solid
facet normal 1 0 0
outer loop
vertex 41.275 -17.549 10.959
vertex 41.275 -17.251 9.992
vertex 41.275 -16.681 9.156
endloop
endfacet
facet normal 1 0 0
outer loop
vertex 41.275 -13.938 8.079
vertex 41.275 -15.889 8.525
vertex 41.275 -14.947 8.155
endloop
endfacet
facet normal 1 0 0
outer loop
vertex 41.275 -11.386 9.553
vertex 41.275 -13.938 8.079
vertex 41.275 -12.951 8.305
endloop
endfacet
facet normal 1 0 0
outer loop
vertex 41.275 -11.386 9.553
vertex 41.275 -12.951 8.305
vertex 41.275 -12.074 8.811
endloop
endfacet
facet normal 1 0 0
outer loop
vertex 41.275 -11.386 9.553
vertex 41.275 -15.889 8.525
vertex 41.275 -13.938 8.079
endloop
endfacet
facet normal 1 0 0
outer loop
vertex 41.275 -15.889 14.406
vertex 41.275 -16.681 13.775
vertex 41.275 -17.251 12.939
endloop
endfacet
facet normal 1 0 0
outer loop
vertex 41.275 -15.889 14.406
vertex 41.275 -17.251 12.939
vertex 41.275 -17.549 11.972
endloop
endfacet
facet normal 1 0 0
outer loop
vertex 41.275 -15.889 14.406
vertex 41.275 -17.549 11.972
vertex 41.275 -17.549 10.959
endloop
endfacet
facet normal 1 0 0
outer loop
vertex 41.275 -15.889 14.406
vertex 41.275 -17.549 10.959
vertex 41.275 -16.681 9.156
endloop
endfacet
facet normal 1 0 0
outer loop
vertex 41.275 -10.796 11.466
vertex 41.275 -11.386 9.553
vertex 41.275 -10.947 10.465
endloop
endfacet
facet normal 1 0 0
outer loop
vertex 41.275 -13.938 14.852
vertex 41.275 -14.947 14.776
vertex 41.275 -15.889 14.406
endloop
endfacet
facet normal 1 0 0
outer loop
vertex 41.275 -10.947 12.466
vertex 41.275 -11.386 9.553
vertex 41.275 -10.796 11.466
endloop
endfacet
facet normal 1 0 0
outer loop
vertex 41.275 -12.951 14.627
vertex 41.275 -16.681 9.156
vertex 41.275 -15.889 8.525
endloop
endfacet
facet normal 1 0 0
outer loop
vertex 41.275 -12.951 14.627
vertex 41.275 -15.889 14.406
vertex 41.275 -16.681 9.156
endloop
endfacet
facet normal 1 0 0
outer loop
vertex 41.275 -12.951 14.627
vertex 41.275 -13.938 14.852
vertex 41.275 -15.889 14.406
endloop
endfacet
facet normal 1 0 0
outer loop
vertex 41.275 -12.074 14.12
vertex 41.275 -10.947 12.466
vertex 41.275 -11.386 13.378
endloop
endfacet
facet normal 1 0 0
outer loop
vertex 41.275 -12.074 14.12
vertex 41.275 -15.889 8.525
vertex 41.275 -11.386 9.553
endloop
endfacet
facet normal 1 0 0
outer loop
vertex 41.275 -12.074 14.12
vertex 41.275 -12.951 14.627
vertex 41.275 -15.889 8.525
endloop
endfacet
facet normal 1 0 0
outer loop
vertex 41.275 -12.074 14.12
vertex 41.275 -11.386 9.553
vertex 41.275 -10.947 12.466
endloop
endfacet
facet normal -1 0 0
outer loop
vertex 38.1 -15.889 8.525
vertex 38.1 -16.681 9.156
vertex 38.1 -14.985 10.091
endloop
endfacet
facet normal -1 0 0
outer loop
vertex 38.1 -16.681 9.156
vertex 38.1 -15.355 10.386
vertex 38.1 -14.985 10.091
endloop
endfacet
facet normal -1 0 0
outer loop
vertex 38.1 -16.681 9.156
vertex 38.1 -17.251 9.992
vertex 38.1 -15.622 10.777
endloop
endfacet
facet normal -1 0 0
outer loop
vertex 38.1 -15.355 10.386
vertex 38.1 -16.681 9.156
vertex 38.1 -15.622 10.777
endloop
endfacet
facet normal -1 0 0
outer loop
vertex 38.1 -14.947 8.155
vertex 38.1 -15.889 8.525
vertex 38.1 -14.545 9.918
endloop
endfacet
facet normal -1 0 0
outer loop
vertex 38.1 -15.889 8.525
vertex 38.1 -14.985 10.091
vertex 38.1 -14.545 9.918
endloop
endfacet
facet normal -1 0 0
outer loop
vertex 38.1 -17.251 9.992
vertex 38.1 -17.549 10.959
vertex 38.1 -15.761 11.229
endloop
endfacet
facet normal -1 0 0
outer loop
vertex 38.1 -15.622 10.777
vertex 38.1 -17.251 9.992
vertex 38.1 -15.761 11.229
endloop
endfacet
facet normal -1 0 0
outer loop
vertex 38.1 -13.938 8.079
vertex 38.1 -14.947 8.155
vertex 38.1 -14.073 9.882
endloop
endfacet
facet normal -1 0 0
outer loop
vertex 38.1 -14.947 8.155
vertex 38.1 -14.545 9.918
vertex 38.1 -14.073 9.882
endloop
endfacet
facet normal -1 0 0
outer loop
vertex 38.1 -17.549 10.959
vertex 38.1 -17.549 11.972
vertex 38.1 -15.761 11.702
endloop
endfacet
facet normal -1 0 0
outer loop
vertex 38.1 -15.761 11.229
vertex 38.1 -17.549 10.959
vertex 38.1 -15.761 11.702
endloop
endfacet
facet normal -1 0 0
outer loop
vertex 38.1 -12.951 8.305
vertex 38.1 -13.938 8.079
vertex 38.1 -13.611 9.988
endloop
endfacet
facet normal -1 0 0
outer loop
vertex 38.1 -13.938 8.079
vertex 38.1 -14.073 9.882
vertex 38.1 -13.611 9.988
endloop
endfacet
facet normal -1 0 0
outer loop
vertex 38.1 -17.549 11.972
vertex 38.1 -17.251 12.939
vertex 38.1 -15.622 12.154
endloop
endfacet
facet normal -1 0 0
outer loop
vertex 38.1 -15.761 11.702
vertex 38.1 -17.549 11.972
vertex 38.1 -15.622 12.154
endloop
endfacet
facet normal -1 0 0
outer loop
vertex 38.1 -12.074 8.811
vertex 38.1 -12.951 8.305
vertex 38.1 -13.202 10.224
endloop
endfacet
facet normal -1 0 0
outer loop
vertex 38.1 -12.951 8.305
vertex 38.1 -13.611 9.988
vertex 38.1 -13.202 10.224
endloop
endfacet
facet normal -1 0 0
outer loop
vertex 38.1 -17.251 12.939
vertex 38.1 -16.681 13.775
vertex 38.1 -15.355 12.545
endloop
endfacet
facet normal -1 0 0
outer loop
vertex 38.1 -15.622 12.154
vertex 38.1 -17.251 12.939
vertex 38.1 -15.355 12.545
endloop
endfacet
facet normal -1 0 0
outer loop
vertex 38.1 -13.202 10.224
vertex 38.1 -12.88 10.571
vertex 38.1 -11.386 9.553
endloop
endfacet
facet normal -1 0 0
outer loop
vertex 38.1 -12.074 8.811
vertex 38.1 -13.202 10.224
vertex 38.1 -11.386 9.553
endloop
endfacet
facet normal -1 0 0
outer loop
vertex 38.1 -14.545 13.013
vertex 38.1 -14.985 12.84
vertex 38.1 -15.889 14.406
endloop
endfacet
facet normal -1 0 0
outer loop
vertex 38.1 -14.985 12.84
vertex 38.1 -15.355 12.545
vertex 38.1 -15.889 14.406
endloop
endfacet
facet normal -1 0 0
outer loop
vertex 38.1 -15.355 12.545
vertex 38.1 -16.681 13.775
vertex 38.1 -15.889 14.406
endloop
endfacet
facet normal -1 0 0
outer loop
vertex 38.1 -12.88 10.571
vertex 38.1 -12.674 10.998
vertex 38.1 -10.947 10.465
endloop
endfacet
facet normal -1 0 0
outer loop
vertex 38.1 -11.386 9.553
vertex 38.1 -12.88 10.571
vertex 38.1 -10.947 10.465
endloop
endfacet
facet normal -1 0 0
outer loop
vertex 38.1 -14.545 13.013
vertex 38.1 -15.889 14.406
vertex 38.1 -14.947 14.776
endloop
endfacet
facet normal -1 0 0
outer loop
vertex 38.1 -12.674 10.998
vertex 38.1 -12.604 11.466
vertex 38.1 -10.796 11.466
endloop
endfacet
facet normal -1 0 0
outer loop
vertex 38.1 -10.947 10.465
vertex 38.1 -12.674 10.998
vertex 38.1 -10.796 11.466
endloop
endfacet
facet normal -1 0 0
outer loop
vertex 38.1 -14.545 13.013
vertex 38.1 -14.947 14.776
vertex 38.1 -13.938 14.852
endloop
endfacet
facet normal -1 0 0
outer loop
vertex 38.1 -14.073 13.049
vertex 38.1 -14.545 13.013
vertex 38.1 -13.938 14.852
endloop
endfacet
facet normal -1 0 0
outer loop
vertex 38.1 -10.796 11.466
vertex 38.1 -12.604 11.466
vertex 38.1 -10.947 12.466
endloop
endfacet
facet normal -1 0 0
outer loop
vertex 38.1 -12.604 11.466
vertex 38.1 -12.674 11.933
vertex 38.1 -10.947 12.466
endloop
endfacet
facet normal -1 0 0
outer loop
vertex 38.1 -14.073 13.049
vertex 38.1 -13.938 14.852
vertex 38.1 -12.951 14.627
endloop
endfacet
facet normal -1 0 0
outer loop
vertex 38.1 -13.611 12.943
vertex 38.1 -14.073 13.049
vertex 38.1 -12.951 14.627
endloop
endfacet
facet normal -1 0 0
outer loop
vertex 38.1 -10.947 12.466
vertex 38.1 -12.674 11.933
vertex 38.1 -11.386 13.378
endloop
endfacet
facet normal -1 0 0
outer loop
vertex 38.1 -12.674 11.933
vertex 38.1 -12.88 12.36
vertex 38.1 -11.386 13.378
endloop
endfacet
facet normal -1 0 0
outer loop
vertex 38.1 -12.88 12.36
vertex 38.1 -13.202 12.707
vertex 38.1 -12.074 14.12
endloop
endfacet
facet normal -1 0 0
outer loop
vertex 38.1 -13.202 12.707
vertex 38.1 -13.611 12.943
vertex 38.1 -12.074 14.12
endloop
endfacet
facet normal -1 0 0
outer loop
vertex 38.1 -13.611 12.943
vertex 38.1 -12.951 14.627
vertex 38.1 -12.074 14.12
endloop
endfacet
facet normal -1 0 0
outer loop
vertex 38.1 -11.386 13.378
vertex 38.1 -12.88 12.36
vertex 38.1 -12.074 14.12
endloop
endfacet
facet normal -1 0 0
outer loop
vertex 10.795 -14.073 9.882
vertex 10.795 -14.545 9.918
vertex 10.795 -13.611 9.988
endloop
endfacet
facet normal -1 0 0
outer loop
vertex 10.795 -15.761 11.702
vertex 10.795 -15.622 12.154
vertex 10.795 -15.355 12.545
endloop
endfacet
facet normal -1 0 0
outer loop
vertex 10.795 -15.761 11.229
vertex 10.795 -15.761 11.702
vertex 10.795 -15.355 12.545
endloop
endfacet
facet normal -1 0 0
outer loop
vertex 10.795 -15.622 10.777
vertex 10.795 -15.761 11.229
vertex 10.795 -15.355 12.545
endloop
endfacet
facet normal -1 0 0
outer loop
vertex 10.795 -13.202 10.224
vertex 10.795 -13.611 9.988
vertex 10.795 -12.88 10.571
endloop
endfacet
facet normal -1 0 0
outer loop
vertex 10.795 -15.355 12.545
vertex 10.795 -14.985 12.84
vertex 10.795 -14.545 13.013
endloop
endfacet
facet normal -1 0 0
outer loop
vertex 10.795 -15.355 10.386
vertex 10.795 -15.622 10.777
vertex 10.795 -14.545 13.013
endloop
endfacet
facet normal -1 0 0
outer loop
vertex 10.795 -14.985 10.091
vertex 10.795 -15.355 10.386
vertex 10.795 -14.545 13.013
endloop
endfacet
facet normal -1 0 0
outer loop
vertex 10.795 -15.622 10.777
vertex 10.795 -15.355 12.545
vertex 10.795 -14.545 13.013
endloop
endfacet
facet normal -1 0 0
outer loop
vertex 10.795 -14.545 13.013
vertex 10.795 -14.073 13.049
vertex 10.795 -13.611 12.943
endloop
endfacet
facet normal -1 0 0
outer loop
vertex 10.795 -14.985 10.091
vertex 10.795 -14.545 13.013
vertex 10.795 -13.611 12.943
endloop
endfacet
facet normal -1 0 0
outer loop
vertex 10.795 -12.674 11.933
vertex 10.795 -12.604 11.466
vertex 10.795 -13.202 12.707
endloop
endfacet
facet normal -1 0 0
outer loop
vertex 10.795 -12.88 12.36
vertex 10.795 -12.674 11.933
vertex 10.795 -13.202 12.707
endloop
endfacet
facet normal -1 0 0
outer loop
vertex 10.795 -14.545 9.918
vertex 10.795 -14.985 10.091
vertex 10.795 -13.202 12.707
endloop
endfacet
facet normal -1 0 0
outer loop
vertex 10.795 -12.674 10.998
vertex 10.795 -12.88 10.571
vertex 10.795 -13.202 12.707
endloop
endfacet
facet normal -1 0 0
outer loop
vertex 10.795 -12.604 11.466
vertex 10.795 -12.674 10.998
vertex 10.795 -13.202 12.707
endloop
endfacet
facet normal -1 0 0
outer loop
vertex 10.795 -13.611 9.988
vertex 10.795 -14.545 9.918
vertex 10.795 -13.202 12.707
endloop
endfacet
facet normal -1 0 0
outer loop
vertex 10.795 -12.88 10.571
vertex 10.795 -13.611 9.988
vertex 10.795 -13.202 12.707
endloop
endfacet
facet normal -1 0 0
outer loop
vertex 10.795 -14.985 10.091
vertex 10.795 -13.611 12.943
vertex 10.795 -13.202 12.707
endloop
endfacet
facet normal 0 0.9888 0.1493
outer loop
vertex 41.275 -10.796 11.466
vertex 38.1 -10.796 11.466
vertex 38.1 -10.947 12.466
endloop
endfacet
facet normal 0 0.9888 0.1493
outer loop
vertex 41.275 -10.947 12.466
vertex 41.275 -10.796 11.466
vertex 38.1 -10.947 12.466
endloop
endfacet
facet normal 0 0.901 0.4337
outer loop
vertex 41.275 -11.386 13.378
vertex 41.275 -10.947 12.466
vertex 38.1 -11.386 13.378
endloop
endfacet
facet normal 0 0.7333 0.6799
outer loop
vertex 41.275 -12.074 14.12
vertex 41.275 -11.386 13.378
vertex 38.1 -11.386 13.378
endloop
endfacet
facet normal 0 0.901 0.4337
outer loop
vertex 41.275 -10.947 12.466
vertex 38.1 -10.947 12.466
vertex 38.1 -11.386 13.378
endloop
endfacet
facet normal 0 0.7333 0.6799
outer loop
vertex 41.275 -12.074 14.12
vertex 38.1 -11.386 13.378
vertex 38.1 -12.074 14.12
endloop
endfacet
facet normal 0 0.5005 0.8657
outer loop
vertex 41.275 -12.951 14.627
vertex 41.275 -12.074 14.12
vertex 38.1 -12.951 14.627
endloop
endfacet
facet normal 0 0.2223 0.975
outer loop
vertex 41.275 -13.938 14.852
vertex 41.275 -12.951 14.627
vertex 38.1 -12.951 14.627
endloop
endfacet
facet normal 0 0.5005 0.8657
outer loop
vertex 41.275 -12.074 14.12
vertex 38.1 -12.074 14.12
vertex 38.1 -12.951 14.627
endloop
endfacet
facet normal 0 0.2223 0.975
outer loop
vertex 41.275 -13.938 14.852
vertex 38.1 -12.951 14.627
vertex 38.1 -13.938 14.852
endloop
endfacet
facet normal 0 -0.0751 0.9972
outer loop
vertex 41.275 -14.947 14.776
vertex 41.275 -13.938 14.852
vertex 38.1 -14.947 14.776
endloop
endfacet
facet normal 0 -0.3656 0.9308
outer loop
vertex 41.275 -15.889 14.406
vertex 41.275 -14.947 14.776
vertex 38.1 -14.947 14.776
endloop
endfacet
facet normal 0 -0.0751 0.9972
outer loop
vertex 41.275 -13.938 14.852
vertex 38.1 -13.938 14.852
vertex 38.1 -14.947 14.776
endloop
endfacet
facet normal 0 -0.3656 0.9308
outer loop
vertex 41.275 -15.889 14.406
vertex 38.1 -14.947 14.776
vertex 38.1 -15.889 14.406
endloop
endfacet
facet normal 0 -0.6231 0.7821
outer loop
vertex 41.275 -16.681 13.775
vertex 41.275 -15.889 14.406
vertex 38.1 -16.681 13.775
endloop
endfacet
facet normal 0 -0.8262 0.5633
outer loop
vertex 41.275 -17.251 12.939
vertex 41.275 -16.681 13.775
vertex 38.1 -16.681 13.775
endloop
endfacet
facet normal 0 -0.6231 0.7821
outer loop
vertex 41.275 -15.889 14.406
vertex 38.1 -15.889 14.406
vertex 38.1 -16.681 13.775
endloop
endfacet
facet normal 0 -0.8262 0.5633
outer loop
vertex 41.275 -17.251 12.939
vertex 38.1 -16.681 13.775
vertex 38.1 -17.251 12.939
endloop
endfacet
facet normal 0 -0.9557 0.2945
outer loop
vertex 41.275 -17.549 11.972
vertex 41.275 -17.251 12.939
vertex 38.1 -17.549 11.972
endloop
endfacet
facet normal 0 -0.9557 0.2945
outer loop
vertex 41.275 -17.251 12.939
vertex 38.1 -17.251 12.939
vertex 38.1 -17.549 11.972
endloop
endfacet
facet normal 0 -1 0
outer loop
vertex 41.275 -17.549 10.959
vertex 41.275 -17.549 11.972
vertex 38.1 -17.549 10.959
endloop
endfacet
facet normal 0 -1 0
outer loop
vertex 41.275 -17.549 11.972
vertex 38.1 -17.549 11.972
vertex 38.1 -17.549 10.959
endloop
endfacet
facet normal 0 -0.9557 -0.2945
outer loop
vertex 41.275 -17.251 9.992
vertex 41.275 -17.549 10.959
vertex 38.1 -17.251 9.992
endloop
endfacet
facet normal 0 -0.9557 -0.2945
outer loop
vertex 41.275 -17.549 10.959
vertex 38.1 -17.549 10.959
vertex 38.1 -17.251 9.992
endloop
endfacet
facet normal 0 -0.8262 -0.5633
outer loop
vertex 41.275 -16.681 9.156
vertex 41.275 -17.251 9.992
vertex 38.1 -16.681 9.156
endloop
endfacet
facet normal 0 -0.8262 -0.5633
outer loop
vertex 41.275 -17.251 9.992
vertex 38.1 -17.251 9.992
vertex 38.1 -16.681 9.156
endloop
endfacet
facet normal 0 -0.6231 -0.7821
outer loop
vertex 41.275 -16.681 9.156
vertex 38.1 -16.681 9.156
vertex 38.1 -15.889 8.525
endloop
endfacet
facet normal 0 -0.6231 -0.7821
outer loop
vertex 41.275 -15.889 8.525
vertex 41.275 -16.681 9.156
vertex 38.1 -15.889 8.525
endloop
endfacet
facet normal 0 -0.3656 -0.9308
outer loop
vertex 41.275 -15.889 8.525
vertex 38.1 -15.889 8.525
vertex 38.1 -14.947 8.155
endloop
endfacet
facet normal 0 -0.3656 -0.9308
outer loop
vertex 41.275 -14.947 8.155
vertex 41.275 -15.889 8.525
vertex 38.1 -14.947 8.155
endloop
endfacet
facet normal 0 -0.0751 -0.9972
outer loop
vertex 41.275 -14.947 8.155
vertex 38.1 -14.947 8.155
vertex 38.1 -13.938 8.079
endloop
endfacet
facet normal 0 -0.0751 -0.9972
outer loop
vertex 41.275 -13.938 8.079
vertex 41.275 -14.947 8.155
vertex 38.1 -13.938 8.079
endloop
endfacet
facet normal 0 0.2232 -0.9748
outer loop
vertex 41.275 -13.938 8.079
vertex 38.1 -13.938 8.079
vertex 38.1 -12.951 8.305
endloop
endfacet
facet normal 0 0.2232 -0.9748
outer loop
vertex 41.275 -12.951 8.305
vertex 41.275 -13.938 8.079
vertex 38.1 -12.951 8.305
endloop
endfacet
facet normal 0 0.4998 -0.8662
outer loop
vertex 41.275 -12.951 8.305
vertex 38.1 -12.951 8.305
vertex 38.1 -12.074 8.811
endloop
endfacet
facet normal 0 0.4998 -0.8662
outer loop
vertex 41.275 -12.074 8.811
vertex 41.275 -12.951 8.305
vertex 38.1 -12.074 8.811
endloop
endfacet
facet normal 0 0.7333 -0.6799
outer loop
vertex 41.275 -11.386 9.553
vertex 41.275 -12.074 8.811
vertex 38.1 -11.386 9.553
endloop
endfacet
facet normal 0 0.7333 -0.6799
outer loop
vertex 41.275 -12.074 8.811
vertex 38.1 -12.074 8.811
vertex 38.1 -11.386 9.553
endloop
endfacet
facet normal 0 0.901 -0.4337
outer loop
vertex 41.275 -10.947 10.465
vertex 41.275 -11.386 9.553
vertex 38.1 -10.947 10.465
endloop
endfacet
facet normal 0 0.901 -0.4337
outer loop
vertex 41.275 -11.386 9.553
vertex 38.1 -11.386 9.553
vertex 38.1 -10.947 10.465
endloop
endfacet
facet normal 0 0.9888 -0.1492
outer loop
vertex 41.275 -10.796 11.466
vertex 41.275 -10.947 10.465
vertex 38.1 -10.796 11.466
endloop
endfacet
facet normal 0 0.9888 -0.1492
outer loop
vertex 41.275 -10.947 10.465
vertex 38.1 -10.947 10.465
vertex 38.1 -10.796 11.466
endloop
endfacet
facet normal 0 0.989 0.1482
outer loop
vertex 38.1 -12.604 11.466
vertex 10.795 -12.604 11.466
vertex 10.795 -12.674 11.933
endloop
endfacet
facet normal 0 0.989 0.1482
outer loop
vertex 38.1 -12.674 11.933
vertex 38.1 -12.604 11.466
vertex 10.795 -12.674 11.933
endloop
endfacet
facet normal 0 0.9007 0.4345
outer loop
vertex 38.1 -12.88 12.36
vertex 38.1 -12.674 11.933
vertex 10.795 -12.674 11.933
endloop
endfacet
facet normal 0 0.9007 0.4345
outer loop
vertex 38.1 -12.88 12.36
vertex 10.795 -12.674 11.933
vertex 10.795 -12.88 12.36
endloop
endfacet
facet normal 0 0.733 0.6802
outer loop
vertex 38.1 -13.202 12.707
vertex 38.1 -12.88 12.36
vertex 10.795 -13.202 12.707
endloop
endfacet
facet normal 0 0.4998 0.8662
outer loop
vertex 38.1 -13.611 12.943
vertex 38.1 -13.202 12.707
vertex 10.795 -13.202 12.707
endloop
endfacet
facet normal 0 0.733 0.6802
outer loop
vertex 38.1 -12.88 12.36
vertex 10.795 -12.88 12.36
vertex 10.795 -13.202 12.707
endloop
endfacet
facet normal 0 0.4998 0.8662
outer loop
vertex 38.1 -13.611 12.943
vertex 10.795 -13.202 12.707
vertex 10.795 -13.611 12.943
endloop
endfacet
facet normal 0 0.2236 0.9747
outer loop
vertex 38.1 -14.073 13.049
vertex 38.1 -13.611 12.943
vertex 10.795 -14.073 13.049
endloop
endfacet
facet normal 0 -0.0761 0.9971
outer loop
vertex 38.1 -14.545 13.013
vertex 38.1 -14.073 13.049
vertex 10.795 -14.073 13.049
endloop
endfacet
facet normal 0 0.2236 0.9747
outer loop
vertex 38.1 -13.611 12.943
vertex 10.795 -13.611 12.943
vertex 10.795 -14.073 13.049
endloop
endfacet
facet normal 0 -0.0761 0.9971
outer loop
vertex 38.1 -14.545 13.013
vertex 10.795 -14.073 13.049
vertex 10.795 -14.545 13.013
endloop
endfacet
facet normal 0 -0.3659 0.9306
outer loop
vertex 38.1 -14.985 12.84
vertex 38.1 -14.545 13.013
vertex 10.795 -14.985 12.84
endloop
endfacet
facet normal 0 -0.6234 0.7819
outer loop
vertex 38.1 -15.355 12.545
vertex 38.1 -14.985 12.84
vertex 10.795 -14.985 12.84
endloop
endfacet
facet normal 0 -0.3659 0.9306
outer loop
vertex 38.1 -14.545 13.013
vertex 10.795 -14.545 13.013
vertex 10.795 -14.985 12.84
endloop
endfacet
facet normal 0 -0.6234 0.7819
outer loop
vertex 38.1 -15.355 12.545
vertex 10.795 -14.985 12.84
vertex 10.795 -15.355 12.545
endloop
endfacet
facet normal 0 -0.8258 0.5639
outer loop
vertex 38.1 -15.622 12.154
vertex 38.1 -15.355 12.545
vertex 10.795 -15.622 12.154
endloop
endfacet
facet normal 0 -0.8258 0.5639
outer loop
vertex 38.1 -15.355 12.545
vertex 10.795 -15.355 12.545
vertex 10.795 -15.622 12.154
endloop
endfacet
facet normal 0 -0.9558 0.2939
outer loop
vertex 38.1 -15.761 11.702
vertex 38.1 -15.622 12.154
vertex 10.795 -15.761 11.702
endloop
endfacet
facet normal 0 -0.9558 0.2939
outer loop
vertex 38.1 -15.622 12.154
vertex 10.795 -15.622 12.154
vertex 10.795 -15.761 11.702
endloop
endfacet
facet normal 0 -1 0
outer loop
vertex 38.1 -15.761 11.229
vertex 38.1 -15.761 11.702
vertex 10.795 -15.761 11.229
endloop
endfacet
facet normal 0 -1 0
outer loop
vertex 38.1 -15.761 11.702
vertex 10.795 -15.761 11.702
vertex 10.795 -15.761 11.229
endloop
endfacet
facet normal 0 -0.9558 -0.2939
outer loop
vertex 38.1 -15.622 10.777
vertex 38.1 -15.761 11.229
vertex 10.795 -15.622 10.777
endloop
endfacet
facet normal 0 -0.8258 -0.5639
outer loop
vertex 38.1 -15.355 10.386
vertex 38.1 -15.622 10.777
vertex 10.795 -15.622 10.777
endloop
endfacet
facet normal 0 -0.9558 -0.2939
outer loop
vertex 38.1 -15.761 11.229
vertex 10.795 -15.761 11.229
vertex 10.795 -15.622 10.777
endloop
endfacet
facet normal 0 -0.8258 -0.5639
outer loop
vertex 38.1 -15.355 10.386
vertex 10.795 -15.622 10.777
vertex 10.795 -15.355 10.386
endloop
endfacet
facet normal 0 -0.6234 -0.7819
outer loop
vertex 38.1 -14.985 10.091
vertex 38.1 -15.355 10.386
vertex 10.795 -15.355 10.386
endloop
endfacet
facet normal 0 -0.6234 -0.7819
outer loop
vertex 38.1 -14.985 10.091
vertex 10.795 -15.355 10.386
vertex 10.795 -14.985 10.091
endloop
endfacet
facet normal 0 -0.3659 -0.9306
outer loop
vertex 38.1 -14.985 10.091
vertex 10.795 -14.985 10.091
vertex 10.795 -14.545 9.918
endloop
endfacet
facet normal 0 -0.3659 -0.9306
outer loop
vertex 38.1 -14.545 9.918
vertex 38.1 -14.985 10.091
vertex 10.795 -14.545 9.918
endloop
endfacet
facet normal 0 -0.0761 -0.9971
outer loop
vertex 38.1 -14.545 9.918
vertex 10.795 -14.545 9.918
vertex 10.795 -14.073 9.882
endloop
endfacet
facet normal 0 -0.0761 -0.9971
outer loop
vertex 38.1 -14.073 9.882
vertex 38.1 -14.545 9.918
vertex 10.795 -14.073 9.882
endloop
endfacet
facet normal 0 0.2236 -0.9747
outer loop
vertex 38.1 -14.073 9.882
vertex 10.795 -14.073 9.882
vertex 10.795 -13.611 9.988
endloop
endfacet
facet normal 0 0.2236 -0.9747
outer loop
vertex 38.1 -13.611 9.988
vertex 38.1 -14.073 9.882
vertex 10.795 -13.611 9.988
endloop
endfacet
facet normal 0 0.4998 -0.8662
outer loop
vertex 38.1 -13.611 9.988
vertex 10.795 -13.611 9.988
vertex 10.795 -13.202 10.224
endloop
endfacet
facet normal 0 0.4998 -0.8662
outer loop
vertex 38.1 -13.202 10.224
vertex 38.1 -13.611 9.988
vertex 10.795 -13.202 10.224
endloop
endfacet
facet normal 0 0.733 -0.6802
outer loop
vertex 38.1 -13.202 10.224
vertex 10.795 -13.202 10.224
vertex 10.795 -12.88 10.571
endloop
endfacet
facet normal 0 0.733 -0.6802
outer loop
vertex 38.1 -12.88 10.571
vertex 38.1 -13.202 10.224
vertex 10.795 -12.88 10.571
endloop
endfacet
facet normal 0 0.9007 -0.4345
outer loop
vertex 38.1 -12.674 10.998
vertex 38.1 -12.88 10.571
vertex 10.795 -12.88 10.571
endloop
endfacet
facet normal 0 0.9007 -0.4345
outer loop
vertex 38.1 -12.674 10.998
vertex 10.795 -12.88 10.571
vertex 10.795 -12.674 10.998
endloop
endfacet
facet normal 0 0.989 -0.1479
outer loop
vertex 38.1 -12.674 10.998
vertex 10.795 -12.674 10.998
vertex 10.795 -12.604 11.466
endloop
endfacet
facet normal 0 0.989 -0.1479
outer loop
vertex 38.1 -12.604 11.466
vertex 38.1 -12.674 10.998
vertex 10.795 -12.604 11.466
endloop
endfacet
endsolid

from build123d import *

# Parameters (mm, degrees)
F0_R     = 1.5875
F1_DEPTH = 38.1
F2_R     = 3.3957745988
F3_DEPTH = 3.175
F4_DEPTH = 10.795


with BuildPart() as f1:
    # F0 (on Right) → F1 (new body)
    with BuildSketch(Plane.YZ):
        with Locations((-14.1914412379, 11.465549469)):
            Circle(F0_R)
    extrude(amount=F1_DEPTH)

    # F2 (on face) → F3 (join)
    with BuildSketch(Plane.YZ.offset(38.1)):
        with Locations((-14.1914412379, 11.465549469)):
            Circle(F2_R)
    extrude(amount=F3_DEPTH)

    # F4 (cut): a face of the model
    f4_faces = [f1.faces().sort_by_distance(p)[0] for p in [
        (0, -14.1914412379, 11.465549469),
    ]]
    extrude(f4_faces, amount=-F4_DEPTH, mode=Mode.SUBTRACT)


solid = f1.part
